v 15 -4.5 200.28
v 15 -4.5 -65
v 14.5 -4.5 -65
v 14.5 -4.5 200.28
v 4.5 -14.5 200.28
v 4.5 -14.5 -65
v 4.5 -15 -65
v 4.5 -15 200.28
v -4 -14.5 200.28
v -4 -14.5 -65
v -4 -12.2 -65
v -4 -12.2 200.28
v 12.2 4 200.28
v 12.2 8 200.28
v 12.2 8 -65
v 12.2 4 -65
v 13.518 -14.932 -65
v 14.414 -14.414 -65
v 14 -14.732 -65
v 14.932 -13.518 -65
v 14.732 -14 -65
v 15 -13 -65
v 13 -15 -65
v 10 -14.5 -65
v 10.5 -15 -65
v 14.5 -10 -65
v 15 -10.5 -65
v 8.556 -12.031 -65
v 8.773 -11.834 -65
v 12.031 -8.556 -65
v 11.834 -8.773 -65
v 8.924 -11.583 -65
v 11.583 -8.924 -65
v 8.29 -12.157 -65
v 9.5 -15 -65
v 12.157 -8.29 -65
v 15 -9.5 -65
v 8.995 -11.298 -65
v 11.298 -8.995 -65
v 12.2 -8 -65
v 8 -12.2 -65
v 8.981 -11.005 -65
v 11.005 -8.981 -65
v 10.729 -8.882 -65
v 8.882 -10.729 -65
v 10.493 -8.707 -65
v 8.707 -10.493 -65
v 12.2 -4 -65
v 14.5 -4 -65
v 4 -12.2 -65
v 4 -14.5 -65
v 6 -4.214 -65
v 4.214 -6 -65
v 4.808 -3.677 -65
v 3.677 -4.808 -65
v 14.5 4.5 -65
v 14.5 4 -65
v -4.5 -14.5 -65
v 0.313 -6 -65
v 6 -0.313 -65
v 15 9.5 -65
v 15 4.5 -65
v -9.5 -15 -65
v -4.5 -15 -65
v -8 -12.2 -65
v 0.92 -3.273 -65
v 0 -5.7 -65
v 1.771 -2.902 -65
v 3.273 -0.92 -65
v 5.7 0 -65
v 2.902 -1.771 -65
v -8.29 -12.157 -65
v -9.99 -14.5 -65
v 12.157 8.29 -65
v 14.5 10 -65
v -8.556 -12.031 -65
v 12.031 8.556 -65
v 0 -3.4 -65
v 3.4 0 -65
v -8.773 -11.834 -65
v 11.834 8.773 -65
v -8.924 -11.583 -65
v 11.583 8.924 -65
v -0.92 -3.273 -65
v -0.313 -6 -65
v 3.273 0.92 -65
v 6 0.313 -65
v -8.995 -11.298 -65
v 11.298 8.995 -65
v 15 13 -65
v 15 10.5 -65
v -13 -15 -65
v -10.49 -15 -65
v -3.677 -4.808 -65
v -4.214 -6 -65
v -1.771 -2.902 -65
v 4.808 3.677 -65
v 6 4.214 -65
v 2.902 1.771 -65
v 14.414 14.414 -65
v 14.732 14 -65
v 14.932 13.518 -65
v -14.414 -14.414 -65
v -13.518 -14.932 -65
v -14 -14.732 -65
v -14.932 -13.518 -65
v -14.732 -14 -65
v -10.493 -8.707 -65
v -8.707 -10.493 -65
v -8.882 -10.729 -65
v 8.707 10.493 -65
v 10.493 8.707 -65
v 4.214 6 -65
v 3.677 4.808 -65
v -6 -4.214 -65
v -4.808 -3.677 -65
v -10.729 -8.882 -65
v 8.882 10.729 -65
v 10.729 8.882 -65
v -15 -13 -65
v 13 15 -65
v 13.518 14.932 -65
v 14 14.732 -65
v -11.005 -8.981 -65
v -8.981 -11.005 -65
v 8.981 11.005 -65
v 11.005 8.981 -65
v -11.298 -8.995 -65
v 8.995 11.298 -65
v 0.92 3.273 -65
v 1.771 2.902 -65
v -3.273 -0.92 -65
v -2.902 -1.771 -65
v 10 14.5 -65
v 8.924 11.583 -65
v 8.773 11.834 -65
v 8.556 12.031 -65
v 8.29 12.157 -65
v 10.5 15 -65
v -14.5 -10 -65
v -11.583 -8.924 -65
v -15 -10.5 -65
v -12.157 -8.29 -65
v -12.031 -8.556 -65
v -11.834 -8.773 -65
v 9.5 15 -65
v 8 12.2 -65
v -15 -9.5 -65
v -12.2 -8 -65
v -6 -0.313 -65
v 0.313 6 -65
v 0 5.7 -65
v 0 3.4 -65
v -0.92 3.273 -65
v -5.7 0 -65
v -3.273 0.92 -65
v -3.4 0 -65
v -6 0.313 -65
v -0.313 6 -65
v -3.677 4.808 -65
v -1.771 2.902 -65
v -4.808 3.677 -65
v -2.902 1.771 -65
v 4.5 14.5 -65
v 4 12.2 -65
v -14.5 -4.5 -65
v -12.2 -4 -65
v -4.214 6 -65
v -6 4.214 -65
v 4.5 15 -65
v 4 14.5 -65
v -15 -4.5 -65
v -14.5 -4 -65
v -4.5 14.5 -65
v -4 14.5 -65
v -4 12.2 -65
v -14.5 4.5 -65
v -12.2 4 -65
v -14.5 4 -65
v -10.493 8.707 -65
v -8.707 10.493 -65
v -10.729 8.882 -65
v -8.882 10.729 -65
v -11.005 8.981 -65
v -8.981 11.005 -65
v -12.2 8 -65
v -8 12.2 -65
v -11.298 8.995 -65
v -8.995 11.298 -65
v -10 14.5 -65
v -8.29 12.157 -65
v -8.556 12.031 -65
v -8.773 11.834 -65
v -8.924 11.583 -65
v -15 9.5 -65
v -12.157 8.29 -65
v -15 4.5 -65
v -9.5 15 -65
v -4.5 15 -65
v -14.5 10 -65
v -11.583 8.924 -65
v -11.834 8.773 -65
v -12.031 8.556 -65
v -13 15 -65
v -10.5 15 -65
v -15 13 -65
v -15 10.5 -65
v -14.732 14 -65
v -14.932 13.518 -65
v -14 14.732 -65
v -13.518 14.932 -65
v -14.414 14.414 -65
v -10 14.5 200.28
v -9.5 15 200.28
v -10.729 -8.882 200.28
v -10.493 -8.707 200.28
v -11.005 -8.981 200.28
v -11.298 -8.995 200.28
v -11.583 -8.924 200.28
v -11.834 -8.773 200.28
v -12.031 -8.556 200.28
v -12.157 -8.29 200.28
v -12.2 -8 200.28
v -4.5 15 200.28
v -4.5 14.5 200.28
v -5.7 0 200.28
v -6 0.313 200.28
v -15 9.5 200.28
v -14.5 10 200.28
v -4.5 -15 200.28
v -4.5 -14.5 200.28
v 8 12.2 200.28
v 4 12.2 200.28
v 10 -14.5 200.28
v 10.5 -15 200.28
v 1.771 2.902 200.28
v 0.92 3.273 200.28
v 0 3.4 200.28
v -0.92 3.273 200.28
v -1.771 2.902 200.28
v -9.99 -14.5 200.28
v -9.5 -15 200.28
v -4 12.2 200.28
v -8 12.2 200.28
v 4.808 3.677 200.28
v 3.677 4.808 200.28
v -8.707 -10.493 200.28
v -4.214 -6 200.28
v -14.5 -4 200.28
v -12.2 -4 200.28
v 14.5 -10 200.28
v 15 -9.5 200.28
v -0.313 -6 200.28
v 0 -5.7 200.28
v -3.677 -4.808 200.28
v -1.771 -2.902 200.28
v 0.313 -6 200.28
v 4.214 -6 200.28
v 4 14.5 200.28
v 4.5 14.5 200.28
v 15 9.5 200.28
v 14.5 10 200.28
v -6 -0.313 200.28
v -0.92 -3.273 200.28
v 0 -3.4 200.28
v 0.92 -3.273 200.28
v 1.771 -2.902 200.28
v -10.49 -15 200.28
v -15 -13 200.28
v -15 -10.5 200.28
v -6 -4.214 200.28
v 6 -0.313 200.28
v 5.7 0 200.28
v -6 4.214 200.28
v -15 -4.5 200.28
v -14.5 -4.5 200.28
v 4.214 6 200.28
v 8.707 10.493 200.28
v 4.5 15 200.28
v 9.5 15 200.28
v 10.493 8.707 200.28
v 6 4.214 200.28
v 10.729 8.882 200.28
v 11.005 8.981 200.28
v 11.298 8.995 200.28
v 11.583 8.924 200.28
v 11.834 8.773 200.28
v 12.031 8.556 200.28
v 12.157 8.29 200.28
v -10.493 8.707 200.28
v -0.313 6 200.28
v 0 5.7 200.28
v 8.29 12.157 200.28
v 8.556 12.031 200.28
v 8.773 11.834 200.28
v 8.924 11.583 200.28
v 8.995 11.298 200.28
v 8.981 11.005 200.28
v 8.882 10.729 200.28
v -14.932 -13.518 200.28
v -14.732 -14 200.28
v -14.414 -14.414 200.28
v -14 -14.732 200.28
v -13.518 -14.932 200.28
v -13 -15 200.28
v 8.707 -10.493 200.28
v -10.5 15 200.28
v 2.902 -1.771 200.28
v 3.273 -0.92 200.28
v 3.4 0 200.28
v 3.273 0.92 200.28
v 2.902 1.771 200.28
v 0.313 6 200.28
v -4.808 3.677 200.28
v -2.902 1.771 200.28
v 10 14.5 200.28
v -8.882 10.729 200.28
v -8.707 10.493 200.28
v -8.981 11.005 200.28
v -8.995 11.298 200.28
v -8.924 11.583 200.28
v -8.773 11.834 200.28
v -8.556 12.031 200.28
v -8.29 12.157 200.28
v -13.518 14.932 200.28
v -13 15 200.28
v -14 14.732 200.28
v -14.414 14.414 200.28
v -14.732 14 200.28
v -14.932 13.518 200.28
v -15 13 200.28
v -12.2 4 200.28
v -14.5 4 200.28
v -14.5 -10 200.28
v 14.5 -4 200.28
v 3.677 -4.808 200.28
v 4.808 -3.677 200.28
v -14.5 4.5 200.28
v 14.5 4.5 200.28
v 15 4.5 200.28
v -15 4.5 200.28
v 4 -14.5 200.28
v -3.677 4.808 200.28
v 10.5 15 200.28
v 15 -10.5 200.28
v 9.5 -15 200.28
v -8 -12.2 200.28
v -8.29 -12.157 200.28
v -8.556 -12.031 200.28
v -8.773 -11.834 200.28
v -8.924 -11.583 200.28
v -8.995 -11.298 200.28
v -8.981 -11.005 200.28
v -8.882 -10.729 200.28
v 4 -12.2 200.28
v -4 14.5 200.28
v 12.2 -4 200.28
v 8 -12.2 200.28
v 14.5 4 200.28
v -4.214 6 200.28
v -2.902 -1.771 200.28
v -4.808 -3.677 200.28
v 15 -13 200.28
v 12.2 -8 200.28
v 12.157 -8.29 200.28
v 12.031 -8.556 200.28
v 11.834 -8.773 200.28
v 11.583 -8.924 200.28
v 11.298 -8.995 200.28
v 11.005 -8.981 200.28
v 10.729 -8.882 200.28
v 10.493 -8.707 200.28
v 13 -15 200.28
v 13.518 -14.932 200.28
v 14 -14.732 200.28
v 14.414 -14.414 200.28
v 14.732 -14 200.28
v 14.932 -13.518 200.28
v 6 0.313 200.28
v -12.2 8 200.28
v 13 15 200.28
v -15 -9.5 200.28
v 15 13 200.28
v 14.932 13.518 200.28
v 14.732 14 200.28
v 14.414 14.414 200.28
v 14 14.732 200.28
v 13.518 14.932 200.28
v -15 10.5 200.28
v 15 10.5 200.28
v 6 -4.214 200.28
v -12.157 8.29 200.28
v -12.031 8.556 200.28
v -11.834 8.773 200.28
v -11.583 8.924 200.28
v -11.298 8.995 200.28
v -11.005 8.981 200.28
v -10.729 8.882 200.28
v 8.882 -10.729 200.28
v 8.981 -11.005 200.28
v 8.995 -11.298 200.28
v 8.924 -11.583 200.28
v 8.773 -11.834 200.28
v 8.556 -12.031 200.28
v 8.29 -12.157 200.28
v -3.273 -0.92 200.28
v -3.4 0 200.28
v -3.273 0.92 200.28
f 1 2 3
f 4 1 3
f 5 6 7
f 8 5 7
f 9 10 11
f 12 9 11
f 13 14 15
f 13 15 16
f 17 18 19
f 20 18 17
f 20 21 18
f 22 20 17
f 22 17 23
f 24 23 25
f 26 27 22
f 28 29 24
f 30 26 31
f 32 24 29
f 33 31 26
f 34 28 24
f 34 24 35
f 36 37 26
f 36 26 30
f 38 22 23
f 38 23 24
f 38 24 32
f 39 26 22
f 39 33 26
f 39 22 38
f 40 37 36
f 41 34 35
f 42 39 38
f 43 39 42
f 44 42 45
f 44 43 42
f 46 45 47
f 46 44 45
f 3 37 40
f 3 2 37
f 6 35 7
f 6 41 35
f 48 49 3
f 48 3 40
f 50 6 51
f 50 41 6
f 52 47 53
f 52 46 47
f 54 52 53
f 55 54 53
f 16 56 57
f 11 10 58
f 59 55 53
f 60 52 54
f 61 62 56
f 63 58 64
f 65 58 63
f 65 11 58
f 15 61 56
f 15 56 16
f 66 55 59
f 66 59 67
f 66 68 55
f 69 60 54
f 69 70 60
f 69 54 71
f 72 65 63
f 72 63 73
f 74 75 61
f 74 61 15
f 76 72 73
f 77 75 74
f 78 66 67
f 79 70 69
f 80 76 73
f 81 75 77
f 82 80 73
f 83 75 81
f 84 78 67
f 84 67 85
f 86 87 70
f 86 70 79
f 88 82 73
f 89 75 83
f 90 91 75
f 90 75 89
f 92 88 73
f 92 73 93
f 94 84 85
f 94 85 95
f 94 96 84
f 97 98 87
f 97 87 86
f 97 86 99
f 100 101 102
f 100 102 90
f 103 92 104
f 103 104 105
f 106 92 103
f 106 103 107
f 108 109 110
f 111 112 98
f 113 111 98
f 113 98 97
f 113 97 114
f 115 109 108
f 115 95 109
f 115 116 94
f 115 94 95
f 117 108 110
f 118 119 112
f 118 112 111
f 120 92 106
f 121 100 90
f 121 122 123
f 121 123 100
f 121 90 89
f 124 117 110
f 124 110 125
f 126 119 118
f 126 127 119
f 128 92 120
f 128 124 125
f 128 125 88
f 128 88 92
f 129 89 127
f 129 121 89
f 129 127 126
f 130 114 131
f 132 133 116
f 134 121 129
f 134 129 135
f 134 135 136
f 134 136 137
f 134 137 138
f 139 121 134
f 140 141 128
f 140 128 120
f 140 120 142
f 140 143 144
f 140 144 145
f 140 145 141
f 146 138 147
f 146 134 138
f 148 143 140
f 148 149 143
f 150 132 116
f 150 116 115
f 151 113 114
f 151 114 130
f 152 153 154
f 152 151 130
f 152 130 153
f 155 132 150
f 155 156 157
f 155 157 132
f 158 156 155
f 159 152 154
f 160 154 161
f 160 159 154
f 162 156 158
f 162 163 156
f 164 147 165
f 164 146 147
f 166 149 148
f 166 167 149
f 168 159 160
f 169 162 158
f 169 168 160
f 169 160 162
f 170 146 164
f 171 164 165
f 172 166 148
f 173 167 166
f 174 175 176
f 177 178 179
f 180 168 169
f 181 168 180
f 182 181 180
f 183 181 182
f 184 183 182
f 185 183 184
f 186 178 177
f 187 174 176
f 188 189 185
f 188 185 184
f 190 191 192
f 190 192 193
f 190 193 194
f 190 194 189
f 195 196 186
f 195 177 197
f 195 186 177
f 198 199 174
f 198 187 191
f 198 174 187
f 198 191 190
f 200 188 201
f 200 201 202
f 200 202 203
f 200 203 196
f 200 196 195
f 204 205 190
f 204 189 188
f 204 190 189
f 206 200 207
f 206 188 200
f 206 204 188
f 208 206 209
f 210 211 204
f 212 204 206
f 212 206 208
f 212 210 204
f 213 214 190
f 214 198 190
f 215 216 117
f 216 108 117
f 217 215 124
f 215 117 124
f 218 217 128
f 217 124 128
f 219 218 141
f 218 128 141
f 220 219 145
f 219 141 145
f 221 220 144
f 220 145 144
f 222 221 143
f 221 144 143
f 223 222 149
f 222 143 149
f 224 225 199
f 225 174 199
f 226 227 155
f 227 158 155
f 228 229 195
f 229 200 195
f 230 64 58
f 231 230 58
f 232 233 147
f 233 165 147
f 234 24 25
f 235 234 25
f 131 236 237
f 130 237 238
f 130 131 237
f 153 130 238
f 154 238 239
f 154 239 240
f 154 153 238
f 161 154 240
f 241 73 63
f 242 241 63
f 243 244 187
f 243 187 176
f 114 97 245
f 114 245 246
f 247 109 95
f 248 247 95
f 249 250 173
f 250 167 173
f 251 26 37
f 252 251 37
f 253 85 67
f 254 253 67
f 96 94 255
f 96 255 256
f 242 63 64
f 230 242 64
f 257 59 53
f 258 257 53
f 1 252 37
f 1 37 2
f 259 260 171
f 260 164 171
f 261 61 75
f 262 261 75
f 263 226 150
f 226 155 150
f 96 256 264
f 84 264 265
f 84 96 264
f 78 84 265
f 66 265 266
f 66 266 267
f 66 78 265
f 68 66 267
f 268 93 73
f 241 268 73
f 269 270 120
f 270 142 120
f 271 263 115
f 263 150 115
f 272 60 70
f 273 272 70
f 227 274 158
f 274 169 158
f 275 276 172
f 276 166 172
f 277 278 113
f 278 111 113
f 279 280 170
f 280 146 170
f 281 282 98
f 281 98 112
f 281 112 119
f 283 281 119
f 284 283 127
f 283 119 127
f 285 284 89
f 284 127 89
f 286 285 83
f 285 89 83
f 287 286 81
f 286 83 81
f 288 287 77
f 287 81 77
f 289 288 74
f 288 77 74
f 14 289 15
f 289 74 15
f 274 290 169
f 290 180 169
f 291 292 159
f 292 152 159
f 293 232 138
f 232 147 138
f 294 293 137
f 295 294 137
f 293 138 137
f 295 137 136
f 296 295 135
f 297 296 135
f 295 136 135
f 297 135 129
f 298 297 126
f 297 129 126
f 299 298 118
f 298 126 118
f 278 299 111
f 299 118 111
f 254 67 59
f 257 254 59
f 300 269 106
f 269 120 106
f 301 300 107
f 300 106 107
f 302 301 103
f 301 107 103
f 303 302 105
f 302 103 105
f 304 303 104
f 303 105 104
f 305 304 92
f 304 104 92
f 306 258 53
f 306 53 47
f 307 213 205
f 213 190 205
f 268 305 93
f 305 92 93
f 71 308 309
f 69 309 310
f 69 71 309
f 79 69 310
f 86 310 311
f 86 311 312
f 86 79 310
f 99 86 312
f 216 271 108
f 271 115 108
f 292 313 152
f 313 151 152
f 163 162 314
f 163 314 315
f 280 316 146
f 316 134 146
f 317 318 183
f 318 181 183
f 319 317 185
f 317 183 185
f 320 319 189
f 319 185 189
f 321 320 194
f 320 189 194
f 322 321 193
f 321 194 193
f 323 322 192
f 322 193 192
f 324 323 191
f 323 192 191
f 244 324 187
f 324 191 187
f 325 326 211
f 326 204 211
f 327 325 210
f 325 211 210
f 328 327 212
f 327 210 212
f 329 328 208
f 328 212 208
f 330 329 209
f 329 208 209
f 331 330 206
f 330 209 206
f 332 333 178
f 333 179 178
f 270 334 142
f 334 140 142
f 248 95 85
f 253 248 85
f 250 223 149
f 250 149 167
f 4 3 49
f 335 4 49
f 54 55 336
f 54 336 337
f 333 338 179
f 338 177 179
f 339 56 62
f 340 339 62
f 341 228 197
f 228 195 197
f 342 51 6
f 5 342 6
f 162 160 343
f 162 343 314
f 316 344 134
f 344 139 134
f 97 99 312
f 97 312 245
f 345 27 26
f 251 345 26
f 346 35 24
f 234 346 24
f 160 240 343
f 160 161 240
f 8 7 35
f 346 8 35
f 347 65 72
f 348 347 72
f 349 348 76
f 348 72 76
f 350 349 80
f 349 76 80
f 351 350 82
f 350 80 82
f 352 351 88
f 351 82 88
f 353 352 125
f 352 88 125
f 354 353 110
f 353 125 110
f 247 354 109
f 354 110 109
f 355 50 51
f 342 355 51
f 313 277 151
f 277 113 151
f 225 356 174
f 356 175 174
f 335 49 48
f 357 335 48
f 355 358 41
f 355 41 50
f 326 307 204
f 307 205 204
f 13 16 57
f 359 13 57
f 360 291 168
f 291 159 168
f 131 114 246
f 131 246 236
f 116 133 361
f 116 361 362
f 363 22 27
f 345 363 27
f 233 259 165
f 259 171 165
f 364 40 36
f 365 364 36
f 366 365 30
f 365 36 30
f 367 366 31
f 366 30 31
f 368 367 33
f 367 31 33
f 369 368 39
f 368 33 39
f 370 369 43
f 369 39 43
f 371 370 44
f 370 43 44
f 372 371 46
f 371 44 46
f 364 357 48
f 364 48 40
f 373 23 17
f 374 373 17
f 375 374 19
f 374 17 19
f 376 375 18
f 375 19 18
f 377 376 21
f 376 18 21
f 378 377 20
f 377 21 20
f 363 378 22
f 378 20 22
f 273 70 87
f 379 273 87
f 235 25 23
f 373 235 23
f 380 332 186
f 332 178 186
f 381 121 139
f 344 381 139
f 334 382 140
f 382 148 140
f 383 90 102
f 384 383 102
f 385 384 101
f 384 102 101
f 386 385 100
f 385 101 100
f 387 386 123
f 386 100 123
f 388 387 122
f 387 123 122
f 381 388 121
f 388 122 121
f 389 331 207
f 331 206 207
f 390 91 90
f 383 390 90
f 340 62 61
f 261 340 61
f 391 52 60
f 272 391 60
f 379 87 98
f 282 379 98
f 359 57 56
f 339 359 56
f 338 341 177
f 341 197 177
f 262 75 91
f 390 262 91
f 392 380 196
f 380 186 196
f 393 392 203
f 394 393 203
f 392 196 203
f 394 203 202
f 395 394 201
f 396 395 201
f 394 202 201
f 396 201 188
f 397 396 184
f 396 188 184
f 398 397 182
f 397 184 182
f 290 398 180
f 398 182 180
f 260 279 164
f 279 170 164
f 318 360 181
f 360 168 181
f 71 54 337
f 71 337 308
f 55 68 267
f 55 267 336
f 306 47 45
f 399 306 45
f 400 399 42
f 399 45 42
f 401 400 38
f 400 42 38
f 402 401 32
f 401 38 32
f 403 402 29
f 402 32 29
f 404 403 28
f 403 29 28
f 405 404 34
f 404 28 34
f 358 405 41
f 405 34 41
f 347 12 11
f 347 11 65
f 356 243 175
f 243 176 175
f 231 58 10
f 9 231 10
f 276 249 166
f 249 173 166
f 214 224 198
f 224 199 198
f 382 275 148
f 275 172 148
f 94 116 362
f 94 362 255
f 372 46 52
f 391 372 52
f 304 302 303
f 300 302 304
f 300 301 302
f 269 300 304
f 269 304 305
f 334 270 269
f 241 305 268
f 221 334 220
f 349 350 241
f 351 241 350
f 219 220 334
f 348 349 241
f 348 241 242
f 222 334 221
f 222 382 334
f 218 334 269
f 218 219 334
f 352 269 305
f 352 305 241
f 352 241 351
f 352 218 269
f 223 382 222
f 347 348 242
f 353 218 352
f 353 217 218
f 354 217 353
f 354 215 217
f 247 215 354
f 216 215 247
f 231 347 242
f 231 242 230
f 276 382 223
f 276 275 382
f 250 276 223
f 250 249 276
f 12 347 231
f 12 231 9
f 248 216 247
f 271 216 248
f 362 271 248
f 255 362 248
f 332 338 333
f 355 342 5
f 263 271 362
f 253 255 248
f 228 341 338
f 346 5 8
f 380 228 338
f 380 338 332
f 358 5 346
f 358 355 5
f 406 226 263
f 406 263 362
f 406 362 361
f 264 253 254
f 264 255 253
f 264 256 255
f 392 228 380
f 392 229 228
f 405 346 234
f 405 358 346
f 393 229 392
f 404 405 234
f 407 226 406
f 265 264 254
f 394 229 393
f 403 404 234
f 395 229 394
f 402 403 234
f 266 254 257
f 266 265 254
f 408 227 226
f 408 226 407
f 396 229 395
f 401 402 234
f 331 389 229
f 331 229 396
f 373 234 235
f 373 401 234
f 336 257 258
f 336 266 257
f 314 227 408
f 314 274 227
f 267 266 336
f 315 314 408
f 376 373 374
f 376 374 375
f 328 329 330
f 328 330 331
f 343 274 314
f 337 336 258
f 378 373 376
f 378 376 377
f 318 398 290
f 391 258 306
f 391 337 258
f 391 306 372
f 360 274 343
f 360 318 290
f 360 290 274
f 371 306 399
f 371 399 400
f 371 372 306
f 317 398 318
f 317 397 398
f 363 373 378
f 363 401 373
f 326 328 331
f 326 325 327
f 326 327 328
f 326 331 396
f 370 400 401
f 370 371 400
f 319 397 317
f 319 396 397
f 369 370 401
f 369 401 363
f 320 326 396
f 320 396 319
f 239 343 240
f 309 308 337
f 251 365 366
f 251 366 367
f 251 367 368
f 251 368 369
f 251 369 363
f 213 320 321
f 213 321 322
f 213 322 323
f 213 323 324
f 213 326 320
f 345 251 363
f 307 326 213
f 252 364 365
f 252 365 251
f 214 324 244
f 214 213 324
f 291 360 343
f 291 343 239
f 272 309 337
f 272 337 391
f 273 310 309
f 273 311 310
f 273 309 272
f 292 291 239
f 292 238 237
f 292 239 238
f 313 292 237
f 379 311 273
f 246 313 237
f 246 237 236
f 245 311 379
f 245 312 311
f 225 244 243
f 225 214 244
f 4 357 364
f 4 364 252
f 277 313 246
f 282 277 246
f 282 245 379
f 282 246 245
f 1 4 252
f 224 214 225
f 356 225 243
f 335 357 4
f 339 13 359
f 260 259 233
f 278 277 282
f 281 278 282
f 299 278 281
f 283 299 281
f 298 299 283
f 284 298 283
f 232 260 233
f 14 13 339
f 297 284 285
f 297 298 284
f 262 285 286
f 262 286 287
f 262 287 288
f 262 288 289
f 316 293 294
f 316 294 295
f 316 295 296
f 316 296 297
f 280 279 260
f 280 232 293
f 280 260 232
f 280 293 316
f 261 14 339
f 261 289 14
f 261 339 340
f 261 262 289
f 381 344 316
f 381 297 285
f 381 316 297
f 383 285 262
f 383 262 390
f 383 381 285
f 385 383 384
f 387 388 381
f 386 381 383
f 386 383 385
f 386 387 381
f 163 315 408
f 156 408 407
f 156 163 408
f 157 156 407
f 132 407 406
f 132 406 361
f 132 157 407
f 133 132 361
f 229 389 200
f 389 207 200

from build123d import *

# Parameters (mm, degrees)
BOSS_EXTRUDE1_DEPTH = 165
BOSS_EXTRUDE2_DEPTH = 100.28


with BuildPart() as part:
    # Sketch1 → Boss-Extrude1 (new body)
    with BuildSketch(Plane(origin=(0, 0, -65), x_dir=(-1, 0, 0), z_dir=(0, 0, -1))):
        with BuildLine():
            Line((-14.999999999, 12.999999999), (-14.999999999, 10.499999999))
            Line((-14.999999999, 10.499999999), (-14.499999999, 9.999999999))
            Line((-14.499999999, 9.999999999), (-14.999999999, 9.5))
            Line((-14.999999999, 9.5), (-14.999999999, 4.5))
            Line((-14.999999999, 4.5), (-14.5, 4.5))
            Line((-14.5, 4.5), (-14.5, 4))
            Line((-14.5, 4), (-12.200000005, 4))
            Line((-12.200000005, 4), (-12.200000005, 7.999999995))
            ThreePointArc((-12.200000005, 7.999999995), (-11.582683434, 8.923879532), (-10.492893215, 8.70710678))
            Line((-10.492893215, 8.70710678), (-6, 4.214213564))
            Line((-6, 4.214213564), (-6, 0.312520903))
            Line((-6, 0.312520903), (-5.7, 0))
            Line((-5.7, 0), (-6, -0.312520901))
            Line((-6, -0.312520901), (-6, -4.214213564))
            Line((-6, -4.214213564), (-10.492893215, -8.70710678))
            ThreePointArc((-10.492893215, -8.70710678), (-11.582683434, -8.923879532), (-12.200000005, -7.999999995))
            Line((-12.200000005, -7.999999995), (-12.200000005, -4))
            Line((-12.200000005, -4), (-14.5, -4))
            Line((-14.5, -4), (-14.5, -4.5))
            Line((-14.5, -4.5), (-14.999999999, -4.5))
            Line((-14.999999999, -4.5), (-14.999999999, -9.500000003))
            Line((-14.999999999, -9.500000003), (-14.499999999, -10.000000002))
            Line((-14.499999999, -10.000000002), (-14.999999999, -10.500000001))
            Line((-14.999999999, -10.500000001), (-14.999999999, -13))
            ThreePointArc((-14.999999999, -13), (-14.414213561, -14.414213562), (-12.999999999, -15))
            Line((-12.999999999, -15), (-10.5, -15))
            Line((-10.5, -15), (-10.000000001, -14.500000001))
            Line((-10.000000001, -14.500000001), (-9.500000001, -15))
            Line((-9.500000001, -15), (-4.5, -15))
            Line((-4.5, -15), (-4.5, -14.5))
            Line((-4.5, -14.5), (-4, -14.5))
            Line((-4, -14.5), (-4, -12.200000005))
            Line((-4, -12.200000005), (-7.999999995, -12.200000005))
            ThreePointArc((-7.999999995, -12.200000005), (-8.923879532, -11.582683434), (-8.70710678, -10.492893215))
            Line((-8.70710678, -10.492893215), (-4.214213564, -6))
            Line((-4.214213564, -6), (-0.312520903, -6))
            Line((-0.312520903, -6), (0, -5.7))
            Line((0, -5.7), (0.312520901, -6))
            Line((0.312520901, -6), (4.214213564, -6))
            Line((4.214213564, -6), (8.70710678, -10.492893215))
            ThreePointArc((8.70710678, -10.492893215), (8.923879532, -11.582683434), (7.999999995, -12.200000005))
            Line((7.999999995, -12.200000005), (4, -12.200000005))
            Line((4, -12.200000005), (4, -14.5))
            Line((4, -14.5), (4.5, -14.5))
            Line((4.5, -14.5), (4.5, -15))
            Line((4.5, -15), (9.500000001, -15))
            Line((9.500000001, -15), (9.989897949, -14.5))
            Line((9.989897949, -14.5), (10.489897949, -15))
            Line((10.489897949, -15), (13, -15))
            ThreePointArc((13, -15), (14.414213562, -14.414213562), (15, -13))
            Line((15, -13), (15, -10.5))
            Line((15, -10.5), (14.500000001, -10.000000001))
            Line((14.500000001, -10.000000001), (15, -9.500000001))
            Line((15, -9.500000001), (15, -4.5))
            Line((15, -4.5), (14.5, -4.5))
            Line((14.5, -4.5), (14.5, -4))
            Line((14.5, -4), (12.200000005, -4))
            Line((12.200000005, -4), (12.200000005, -7.999999995))
            ThreePointArc((12.200000005, -7.999999995), (11.582683434, -8.923879532), (10.492893215, -8.70710678))
            Line((10.492893215, -8.70710678), (6, -4.214213564))
            Line((6, -4.214213564), (6, -0.312520903))
            Line((6, -0.312520903), (5.7, 0))
            Line((5.7, 0), (6, 0.312520901))
            Line((6, 0.312520901), (6, 4.214213564))
            Line((6, 4.214213564), (10.492893215, 8.707106779))
            ThreePointArc((10.492893215, 8.707106779), (11.582683434, 8.923879532), (12.200000005, 7.999999994))
            Line((12.200000005, 7.999999994), (12.200000005, 4))
            Line((12.200000005, 4), (14.5, 4))
            Line((14.5, 4), (14.5, 4.5))
            Line((14.5, 4.5), (15, 4.5))
            Line((15, 4.5), (15, 9.500000001))
            Line((15, 9.500000001), (14.500000001, 10.000000001))
            Line((14.500000001, 10.000000001), (15, 10.5))
            Line((15, 10.5), (15, 12.999999999))
            ThreePointArc((15, 12.999999999), (14.414213562, 14.414213561), (13, 14.999999999))
            Line((13, 14.999999999), (10.500000001, 14.999999999))
            Line((10.500000001, 14.999999999), (10.000000002, 14.499999999))
            Line((10.000000002, 14.499999999), (9.500000003, 14.999999999))
            Line((9.500000003, 14.999999999), (4.5, 14.999999999))
            Line((4.5, 14.999999999), (4.5, 14.5))
            Line((4.5, 14.5), (4, 14.5))
            Line((4, 14.5), (4, 12.200000005))
            Line((4, 12.200000005), (7.999999995, 12.200000005))
            ThreePointArc((7.999999995, 12.200000005), (8.923879532, 11.582683434), (8.70710678, 10.492893215))
            Line((8.70710678, 10.492893215), (4.214213564, 6))
            Line((4.214213564, 6), (0.312520903, 6))
            Line((0.312520903, 6), (0, 5.7))
            Line((0, 5.7), (-0.312520901, 6))
            Line((-0.312520901, 6), (-4.214213564, 6))
            Line((-4.214213564, 6), (-8.707106779, 10.492893215))
            ThreePointArc((-8.707106779, 10.492893215), (-8.923879532, 11.582683434), (-7.999999994, 12.200000005))
            Line((-7.999999994, 12.200000005), (-4, 12.200000005))
            Line((-4, 12.200000005), (-4, 14.5))
            Line((-4, 14.5), (-4.5, 14.5))
            Line((-4.5, 14.5), (-4.5, 14.999999999))
            Line((-4.5, 14.999999999), (-9.5, 14.999999999))
            Line((-9.5, 14.999999999), (-9.999999999, 14.499999999))
            Line((-9.999999999, 14.499999999), (-10.499999999, 14.999999999))
            Line((-10.499999999, 14.999999999), (-12.999999999, 14.999999999))
            ThreePointArc((-12.999999999, 14.999999999), (-14.414213561, 14.414213561), (-14.999999999, 12.999999999))
        make_face()
        with BuildLine():
            Line((4.808326112, 3.676955262), (2.902349714, 1.770978864))
            ThreePointArc((2.902349714, 1.770978864), (3.4, 0), (2.902349714, -1.770978864))
            Line((2.902349714, -1.770978864), (4.808326112, -3.676955262))
            Line((4.808326112, -3.676955262), (3.676955262, -4.808326112))
            Line((3.676955262, -4.808326112), (1.770978864, -2.902349714))
            ThreePointArc((1.770978864, -2.902349714), (0, -3.4), (-1.770978864, -2.902349714))
            Line((-1.770978864, -2.902349714), (-3.676955262, -4.808326112))
            Line((-3.676955262, -4.808326112), (-4.808326112, -3.676955262))
            Line((-4.808326112, -3.676955262), (-2.902349714, -1.770978864))
            ThreePointArc((-2.902349714, -1.770978864), (-3.4, 0), (-2.902349714, 1.770978864))
            Line((-2.902349714, 1.770978864), (-4.808326112, 3.676955262))
            Line((-4.808326112, 3.676955262), (-3.676955262, 4.808326112))
            Line((-3.676955262, 4.808326112), (-1.770978864, 2.902349714))
            ThreePointArc((-1.770978864, 2.902349714), (0, 3.4), (1.770978864, 2.902349714))
            Line((1.770978864, 2.902349714), (3.676955262, 4.808326112))
            Line((3.676955262, 4.808326112), (4.808326112, 3.676955262))
        make_face(mode=Mode.SUBTRACT)
    extrude(amount=-BOSS_EXTRUDE1_DEPTH)

    # Sketch2 → Boss-Extrude2 (add)
    with BuildSketch(Plane.XY.offset(100)):
        with BuildLine():
            Line((12.999999999, 14.999999999), (10.499999999, 14.999999999))
            Line((10.499999999, 14.999999999), (9.999999999, 14.499999999))
            Line((9.999999999, 14.499999999), (9.5, 14.999999999))
            Line((9.5, 14.999999999), (4.5, 14.999999999))
            Line((4.5, 14.999999999), (4.5, 14.5))
            Line((4.5, 14.5), (4, 14.5))
            Line((4, 14.5), (4, 12.200000005))
            Line((4, 12.200000005), (7.999999994, 12.200000005))
            ThreePointArc((7.999999994, 12.200000005), (8.923879532, 11.582683434), (8.707106779, 10.492893215))
            Line((8.707106779, 10.492893215), (4.214213564, 6))
            Line((4.214213564, 6), (0.312520901, 6))
            Line((0.312520901, 6), (0, 5.7))
            Line((0, 5.7), (-0.312520903, 6))
            Line((-0.312520903, 6), (-4.214213564, 6))
            Line((-4.214213564, 6), (-8.70710678, 10.492893215))
            ThreePointArc((-8.70710678, 10.492893215), (-8.923879532, 11.582683434), (-7.999999995, 12.200000005))
            Line((-7.999999995, 12.200000005), (-4, 12.200000005))
            Line((-4, 12.200000005), (-4, 14.5))
            Line((-4, 14.5), (-4.5, 14.5))
            Line((-4.5, 14.5), (-4.5, 14.999999999))
            Line((-4.5, 14.999999999), (-9.500000003, 14.999999999))
            Line((-9.500000003, 14.999999999), (-10.000000002, 14.499999999))
            Line((-10.000000002, 14.499999999), (-10.500000001, 14.999999999))
            Line((-10.500000001, 14.999999999), (-13, 14.999999999))
            ThreePointArc((-13, 14.999999999), (-14.414213562, 14.414213561), (-15, 12.999999999))
            Line((-15, 12.999999999), (-15, 10.5))
            Line((-15, 10.5), (-14.500000001, 10.000000001))
            Line((-14.500000001, 10.000000001), (-15, 9.500000001))
            Line((-15, 9.500000001), (-15, 4.5))
            Line((-15, 4.5), (-14.5, 4.5))
            Line((-14.5, 4.5), (-14.5, 4))
            Line((-14.5, 4), (-12.200000005, 4))
            Line((-12.200000005, 4), (-12.200000005, 7.999999994))
            ThreePointArc((-12.200000005, 7.999999994), (-11.582683434, 8.923879532), (-10.492893215, 8.707106779))
            Line((-10.492893215, 8.707106779), (-6, 4.214213564))
            Line((-6, 4.214213564), (-6, 0.312520901))
            Line((-6, 0.312520901), (-5.7, 0))
            Line((-5.7, 0), (-6, -0.312520903))
            Line((-6, -0.312520903), (-6, -4.214213564))
            Line((-6, -4.214213564), (-10.492893215, -8.70710678))
            ThreePointArc((-10.492893215, -8.70710678), (-11.582683434, -8.923879532), (-12.200000005, -7.999999995))
            Line((-12.200000005, -7.999999995), (-12.200000005, -4))
            Line((-12.200000005, -4), (-14.5, -4))
            Line((-14.5, -4), (-14.5, -4.5))
            Line((-14.5, -4.5), (-15, -4.5))
            Line((-15, -4.5), (-15, -9.500000001))
            Line((-15, -9.500000001), (-14.500000001, -10.000000001))
            Line((-14.500000001, -10.000000001), (-15, -10.5))
            Line((-15, -10.5), (-15, -13))
            ThreePointArc((-15, -13), (-14.414213562, -14.414213562), (-13, -15))
            Line((-13, -15), (-10.489897949, -15))
            Line((-10.489897949, -15), (-9.989897949, -14.5))
            Line((-9.989897949, -14.5), (-9.500000001, -15))
            Line((-9.500000001, -15), (-4.5, -15))
            Line((-4.5, -15), (-4.5, -14.5))
            Line((-4.5, -14.5), (-4, -14.5))
            Line((-4, -14.5), (-4, -12.200000005))
            Line((-4, -12.200000005), (-7.999999995, -12.200000005))
            ThreePointArc((-7.999999995, -12.200000005), (-8.923879532, -11.582683434), (-8.70710678, -10.492893215))
            Line((-8.70710678, -10.492893215), (-4.214213564, -6))
            Line((-4.214213564, -6), (-0.312520901, -6))
            Line((-0.312520901, -6), (0, -5.7))
            Line((0, -5.7), (0.312520903, -6))
            Line((0.312520903, -6), (4.214213564, -6))
            Line((4.214213564, -6), (8.70710678, -10.492893215))
            ThreePointArc((8.70710678, -10.492893215), (8.923879532, -11.582683434), (7.999999995, -12.200000005))
            Line((7.999999995, -12.200000005), (4, -12.200000005))
            Line((4, -12.200000005), (4, -14.5))
            Line((4, -14.5), (4.5, -14.5))
            Line((4.5, -14.5), (4.5, -15))
            Line((4.5, -15), (9.500000001, -15))
            Line((9.500000001, -15), (10.000000001, -14.500000001))
            Line((10.000000001, -14.500000001), (10.5, -15))
            Line((10.5, -15), (12.999999999, -15))
            ThreePointArc((12.999999999, -15), (14.414213561, -14.414213562), (14.999999999, -13))
            Line((14.999999999, -13), (14.999999999, -10.500000001))
            Line((14.999999999, -10.500000001), (14.499999999, -10.000000002))
            Line((14.499999999, -10.000000002), (14.999999999, -9.500000003))
            Line((14.999999999, -9.500000003), (14.999999999, -4.5))
            Line((14.999999999, -4.5), (14.5, -4.5))
            Line((14.5, -4.5), (14.5, -4))
            Line((14.5, -4), (12.200000005, -4))
            Line((12.200000005, -4), (12.200000005, -7.999999995))
            ThreePointArc((12.200000005, -7.999999995), (11.582683434, -8.923879532), (10.492893215, -8.70710678))
            Line((10.492893215, -8.70710678), (6, -4.214213564))
            Line((6, -4.214213564), (6, -0.312520901))
            Line((6, -0.312520901), (5.7, 0))
            Line((5.7, 0), (6, 0.312520903))
            Line((6, 0.312520903), (6, 4.214213564))
            Line((6, 4.214213564), (10.492893215, 8.70710678))
            ThreePointArc((10.492893215, 8.70710678), (11.582683434, 8.923879532), (12.200000005, 7.999999995))
            Line((12.200000005, 7.999999995), (12.200000005, 4))
            Line((12.200000005, 4), (14.5, 4))
            Line((14.5, 4), (14.5, 4.5))
            Line((14.5, 4.5), (14.999999999, 4.5))
            Line((14.999999999, 4.5), (14.999999999, 9.5))
            Line((14.999999999, 9.5), (14.499999999, 9.999999999))
            Line((14.499999999, 9.999999999), (14.999999999, 10.499999999))
            Line((14.999999999, 10.499999999), (14.999999999, 12.999999999))
            ThreePointArc((14.999999999, 12.999999999), (14.414213561, 14.414213561), (12.999999999, 14.999999999))
        make_face()
        with BuildLine():
            Line((-1.770978864, 2.902349714), (-3.676955262, 4.808326112))
            Line((-3.676955262, 4.808326112), (-4.808326112, 3.676955262))
            Line((-4.808326112, 3.676955262), (-2.902349714, 1.770978864))
            ThreePointArc((-2.902349714, 1.770978864), (-3.4, 0), (-2.902349714, -1.770978864))
            Line((-2.902349714, -1.770978864), (-4.808326112, -3.676955262))
            Line((-4.808326112, -3.676955262), (-3.676955262, -4.808326112))
            Line((-3.676955262, -4.808326112), (-1.770978864, -2.902349714))
            ThreePointArc((-1.770978864, -2.902349714), (0, -3.4), (1.770978864, -2.902349714))
            Line((1.770978864, -2.902349714), (3.676955262, -4.808326112))
            Line((3.676955262, -4.808326112), (4.808326112, -3.676955262))
            Line((4.808326112, -3.676955262), (2.902349714, -1.770978864))
            ThreePointArc((2.902349714, -1.770978864), (3.4, 0), (2.902349714, 1.770978864))
            Line((2.902349714, 1.770978864), (4.808326112, 3.676955262))
            Line((4.808326112, 3.676955262), (3.676955262, 4.808326112))
            Line((3.676955262, 4.808326112), (1.770978864, 2.902349714))
            ThreePointArc((1.770978864, 2.902349714), (0, 3.4), (-1.770978864, 2.902349714))
        make_face(mode=Mode.SUBTRACT)
    extrude(amount=BOSS_EXTRUDE2_DEPTH)


solid = part.part
